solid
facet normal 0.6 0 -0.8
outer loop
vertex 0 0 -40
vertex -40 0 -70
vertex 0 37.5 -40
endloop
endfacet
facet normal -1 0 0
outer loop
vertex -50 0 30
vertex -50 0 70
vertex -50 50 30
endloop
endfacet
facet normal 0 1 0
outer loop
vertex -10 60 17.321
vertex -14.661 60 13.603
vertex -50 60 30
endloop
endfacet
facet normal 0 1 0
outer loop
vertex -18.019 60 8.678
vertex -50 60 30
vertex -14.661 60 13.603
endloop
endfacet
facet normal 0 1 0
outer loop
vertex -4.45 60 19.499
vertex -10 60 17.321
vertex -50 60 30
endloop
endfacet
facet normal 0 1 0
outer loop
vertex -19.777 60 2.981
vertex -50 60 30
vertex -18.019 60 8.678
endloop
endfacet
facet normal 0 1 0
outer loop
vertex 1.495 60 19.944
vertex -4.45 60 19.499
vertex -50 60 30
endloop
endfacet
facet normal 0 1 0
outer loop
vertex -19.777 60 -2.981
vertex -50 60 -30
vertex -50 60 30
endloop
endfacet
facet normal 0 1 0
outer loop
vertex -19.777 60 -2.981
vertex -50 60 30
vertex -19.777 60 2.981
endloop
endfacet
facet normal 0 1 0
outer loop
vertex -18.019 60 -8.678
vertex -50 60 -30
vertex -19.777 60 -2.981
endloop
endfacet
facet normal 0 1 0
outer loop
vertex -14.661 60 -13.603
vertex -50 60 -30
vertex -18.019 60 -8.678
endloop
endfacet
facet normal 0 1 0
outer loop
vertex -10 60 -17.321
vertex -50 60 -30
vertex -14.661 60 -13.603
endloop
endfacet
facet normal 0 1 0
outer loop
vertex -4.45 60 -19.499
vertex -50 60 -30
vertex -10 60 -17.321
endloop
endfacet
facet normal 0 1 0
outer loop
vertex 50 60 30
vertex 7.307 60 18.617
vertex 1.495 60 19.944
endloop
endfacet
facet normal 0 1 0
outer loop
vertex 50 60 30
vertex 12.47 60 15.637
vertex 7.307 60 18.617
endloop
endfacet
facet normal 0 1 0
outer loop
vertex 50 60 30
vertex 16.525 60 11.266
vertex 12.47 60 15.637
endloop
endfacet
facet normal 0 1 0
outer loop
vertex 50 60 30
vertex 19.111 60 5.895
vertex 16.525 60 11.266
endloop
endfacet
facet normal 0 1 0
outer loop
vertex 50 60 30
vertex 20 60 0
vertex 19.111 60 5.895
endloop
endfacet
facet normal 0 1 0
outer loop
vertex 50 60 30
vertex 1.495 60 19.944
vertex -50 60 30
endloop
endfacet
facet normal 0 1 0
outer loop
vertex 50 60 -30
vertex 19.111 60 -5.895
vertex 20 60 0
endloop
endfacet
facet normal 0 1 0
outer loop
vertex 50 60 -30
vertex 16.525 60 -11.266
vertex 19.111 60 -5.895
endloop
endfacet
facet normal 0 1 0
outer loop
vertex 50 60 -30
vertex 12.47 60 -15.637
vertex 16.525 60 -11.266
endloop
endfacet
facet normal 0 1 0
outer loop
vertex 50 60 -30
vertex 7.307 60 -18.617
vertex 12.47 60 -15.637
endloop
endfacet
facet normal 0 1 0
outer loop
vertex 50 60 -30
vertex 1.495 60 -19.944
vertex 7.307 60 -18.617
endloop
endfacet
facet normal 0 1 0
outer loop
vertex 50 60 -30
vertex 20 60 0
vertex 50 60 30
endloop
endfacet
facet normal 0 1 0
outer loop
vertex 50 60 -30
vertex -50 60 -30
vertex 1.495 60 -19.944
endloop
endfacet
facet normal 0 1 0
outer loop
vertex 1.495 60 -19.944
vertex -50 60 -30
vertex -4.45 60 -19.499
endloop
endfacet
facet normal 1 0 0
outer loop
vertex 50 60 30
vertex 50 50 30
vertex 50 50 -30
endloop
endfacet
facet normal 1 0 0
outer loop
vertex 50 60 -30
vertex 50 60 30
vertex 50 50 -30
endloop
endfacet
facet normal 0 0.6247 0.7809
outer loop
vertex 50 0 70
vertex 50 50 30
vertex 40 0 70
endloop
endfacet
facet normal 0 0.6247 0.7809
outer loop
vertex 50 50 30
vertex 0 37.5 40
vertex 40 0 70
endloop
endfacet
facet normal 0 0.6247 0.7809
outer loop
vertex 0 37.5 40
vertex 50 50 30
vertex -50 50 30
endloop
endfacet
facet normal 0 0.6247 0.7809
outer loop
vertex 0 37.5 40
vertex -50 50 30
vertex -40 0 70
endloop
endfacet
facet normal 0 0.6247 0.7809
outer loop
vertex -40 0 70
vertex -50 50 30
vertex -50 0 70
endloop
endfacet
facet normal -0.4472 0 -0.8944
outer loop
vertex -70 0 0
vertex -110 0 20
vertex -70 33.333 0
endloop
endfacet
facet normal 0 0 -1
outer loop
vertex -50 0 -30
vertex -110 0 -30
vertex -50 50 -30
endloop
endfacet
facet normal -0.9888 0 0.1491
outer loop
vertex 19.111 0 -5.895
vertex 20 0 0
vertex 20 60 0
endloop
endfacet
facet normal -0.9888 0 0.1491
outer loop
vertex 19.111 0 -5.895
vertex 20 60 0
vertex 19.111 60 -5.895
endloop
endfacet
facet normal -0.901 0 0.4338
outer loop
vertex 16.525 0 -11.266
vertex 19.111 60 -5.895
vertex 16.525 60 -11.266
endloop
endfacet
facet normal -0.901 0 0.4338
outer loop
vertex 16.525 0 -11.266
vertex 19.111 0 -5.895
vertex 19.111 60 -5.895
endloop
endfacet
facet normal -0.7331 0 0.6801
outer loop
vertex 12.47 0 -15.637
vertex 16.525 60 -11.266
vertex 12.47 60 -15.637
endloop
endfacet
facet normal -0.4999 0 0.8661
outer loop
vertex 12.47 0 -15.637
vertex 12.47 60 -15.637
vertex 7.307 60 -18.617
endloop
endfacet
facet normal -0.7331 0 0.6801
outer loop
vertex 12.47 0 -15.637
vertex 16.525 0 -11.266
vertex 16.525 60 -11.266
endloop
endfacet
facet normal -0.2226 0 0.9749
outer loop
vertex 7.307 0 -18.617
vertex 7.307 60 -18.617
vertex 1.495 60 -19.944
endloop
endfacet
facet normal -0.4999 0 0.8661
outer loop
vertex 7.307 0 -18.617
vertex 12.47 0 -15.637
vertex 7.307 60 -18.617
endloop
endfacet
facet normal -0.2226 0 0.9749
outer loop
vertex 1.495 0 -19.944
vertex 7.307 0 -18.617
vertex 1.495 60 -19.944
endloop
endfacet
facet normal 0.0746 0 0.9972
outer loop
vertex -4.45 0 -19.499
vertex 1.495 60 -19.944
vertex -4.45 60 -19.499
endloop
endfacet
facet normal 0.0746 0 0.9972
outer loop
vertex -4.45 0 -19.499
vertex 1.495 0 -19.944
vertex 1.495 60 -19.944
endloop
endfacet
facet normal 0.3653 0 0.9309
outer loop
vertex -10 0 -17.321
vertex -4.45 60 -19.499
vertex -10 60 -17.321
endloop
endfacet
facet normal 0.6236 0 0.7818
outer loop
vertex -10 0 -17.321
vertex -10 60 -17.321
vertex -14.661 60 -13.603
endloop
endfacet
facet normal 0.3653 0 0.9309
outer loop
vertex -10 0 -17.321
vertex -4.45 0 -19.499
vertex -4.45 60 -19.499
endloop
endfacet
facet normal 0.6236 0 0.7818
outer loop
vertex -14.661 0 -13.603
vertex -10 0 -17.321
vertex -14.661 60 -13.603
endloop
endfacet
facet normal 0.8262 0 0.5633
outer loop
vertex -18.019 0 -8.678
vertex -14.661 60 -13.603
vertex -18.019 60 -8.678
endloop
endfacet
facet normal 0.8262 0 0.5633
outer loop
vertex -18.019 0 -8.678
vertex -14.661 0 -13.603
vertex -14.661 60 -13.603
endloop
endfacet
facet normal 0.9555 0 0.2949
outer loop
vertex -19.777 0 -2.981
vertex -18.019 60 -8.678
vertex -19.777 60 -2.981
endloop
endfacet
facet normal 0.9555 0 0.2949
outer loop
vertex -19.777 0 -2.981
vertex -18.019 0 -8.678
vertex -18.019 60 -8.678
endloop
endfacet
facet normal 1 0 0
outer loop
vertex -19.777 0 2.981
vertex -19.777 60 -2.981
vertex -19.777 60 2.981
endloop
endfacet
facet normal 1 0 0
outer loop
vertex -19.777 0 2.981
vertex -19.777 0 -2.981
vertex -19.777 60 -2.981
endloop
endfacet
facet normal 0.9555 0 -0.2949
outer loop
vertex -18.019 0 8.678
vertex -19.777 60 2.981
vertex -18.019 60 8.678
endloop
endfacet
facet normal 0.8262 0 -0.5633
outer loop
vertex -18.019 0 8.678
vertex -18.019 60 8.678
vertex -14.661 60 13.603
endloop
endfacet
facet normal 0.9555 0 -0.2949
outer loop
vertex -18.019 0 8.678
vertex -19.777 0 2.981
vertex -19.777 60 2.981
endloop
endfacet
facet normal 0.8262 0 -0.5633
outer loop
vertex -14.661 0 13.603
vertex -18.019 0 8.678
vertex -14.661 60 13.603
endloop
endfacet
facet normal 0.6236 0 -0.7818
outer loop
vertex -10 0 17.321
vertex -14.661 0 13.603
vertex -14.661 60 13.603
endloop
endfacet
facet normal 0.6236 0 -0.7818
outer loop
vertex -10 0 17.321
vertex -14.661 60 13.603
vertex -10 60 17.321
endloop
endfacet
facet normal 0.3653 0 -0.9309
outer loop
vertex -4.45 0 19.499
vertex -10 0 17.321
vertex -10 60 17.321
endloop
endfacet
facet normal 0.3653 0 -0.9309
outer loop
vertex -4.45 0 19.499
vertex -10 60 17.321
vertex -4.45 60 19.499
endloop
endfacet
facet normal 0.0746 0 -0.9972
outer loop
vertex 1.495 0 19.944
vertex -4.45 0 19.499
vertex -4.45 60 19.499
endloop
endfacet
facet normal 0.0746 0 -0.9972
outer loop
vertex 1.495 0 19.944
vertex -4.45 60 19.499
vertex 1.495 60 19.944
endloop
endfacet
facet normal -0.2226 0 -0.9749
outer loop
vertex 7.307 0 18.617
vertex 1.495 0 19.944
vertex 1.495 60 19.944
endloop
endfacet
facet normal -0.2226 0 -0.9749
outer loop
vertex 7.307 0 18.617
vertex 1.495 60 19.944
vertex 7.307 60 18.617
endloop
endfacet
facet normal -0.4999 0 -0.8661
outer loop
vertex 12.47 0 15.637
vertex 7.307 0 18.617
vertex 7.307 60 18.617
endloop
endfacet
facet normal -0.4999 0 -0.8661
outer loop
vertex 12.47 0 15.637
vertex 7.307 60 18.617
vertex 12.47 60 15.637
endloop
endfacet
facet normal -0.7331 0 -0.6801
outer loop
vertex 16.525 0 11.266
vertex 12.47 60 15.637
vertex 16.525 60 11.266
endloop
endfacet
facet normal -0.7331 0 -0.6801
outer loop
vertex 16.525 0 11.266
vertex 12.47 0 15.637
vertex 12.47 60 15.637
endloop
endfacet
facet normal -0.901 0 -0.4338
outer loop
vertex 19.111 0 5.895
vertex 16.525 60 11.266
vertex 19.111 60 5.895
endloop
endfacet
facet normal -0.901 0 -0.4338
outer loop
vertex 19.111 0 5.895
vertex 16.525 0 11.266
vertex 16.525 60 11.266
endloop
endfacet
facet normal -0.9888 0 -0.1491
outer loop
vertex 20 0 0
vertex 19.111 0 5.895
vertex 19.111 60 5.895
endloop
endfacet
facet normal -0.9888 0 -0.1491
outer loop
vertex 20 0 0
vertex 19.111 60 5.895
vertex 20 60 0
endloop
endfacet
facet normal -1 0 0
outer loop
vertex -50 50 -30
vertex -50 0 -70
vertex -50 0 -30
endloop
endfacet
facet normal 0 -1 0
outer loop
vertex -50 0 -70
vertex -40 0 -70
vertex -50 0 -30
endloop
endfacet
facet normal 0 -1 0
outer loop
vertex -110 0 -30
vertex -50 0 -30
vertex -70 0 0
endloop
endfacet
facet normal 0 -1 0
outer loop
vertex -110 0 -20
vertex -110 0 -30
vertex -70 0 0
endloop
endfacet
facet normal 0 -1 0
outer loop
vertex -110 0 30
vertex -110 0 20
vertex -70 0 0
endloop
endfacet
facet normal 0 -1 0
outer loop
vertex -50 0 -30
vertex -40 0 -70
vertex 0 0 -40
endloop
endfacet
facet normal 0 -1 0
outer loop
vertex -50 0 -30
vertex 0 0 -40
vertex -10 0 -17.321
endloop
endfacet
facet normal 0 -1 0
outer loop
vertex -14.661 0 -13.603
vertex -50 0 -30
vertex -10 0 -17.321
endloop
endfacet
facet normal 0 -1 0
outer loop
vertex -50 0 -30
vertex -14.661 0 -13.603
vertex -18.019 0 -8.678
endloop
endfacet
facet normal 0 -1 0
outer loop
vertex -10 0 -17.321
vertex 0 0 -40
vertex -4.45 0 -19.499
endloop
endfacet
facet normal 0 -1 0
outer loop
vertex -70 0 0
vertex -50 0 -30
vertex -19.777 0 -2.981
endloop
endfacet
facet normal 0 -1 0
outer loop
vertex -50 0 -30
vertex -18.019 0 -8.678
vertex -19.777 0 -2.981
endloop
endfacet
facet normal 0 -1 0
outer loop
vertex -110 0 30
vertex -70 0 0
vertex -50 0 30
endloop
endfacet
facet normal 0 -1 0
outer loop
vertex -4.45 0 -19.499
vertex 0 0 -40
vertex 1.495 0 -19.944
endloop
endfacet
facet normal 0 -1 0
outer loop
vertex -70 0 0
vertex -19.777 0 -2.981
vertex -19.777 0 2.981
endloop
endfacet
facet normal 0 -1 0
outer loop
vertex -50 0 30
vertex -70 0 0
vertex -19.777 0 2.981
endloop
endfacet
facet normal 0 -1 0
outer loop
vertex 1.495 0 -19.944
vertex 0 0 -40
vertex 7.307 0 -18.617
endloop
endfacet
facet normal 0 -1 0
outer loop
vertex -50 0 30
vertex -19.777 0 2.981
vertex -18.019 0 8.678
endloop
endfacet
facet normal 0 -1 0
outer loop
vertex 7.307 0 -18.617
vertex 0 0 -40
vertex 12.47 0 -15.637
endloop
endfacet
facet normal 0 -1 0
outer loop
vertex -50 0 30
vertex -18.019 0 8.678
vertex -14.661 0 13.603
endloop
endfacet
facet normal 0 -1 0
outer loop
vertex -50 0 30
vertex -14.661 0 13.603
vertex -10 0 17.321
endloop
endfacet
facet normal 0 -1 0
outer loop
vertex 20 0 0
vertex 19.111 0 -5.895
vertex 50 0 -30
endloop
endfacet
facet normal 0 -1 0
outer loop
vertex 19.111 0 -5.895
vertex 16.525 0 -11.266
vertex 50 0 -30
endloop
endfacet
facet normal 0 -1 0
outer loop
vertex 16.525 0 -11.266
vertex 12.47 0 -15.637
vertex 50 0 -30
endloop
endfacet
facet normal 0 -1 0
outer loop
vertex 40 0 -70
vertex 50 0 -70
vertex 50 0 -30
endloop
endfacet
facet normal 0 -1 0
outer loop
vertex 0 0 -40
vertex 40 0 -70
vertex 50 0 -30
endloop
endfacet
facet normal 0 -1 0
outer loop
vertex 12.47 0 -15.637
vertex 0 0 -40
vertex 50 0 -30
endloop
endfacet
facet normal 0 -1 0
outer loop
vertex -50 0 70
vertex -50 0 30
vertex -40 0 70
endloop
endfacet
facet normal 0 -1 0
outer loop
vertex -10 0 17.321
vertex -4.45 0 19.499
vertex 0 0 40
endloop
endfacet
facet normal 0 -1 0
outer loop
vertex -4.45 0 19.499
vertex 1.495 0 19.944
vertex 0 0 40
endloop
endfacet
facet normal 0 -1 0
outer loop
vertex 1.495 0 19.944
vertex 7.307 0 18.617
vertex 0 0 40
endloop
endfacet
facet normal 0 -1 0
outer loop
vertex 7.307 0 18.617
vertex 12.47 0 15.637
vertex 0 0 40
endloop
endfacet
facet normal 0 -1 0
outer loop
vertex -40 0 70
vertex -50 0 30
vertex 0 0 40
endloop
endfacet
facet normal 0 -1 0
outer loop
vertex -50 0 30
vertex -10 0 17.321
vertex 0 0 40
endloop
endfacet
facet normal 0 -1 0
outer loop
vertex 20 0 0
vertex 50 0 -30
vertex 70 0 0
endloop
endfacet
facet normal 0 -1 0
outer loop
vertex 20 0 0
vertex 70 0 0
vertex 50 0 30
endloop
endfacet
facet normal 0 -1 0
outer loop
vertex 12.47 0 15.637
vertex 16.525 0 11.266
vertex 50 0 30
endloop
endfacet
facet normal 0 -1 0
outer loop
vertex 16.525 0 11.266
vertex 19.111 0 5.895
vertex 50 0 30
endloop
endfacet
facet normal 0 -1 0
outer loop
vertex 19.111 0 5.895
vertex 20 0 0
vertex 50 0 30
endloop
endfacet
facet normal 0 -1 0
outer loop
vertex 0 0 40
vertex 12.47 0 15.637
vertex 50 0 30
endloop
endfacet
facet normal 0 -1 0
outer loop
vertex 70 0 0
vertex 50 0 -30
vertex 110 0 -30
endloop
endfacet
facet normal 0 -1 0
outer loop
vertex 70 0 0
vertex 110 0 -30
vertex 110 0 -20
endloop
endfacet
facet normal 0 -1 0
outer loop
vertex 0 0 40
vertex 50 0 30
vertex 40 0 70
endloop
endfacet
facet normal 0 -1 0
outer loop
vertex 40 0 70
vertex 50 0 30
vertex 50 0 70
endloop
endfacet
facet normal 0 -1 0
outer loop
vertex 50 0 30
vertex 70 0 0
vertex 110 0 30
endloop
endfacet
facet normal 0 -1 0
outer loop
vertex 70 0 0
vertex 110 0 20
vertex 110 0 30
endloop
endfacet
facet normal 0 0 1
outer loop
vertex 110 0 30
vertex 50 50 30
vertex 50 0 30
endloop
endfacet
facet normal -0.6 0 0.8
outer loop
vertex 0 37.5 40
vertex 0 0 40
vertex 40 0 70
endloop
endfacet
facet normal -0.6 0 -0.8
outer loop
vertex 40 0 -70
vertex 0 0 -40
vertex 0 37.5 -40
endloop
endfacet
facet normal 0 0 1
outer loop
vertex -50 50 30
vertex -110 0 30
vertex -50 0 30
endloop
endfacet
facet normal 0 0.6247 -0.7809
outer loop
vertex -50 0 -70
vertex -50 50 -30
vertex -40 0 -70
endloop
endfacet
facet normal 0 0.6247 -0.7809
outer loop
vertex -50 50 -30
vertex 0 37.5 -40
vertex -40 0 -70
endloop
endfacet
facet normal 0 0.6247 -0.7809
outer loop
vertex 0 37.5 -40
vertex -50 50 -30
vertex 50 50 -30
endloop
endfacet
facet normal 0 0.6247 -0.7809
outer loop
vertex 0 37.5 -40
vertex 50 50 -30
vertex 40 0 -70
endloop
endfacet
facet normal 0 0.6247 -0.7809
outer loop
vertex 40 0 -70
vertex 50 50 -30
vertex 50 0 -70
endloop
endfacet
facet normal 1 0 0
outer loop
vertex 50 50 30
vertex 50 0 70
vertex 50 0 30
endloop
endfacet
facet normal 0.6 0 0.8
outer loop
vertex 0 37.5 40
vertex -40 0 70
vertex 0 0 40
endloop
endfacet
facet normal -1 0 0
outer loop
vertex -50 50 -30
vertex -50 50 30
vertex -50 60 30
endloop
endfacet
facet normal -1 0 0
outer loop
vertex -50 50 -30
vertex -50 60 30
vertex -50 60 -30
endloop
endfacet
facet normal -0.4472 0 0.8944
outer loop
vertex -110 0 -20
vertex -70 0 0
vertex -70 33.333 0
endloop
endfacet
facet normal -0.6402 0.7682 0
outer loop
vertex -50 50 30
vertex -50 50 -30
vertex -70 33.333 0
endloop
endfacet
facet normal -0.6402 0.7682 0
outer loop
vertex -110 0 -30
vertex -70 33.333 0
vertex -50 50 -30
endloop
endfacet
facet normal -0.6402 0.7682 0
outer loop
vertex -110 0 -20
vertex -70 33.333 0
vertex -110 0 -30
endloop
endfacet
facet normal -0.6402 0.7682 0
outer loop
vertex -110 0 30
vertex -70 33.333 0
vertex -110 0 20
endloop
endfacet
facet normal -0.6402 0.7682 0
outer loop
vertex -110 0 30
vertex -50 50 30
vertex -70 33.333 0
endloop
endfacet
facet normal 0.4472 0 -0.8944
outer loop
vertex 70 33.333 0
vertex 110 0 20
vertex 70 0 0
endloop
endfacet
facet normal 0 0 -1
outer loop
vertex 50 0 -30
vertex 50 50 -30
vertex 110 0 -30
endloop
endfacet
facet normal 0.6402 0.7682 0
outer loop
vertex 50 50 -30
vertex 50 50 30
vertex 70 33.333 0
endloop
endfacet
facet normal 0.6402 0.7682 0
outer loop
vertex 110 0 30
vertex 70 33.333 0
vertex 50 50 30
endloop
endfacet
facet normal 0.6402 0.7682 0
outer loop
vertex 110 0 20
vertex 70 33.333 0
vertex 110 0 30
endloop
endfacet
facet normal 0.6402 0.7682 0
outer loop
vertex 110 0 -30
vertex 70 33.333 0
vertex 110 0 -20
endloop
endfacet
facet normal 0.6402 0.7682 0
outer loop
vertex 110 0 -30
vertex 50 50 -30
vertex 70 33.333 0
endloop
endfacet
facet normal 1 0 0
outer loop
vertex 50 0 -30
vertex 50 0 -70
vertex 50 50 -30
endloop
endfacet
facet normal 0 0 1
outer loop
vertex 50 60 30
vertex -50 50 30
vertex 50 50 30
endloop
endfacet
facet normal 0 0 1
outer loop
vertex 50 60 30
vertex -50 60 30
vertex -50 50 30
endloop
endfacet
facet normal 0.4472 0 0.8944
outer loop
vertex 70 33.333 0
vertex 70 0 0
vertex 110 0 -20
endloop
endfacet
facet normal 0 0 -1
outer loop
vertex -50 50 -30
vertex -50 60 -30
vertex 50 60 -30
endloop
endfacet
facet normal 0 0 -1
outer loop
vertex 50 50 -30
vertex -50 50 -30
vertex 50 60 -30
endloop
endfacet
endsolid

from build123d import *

# Parameters (mm, degrees)
SKETCH1_W           = 100
SKETCH1_H           = 60
SKETCH1_R           = 20
BOSS_EXTRUDE1_DEPTH = 60
BOSS_EXTRUDE2_DEPTH = 30
BOSS_EXTRUDE3_DEPTH = 50
CUT_EXTRUDE1_DEPTH  = 61


with BuildPart() as part:
    # Sketch1 → Boss-Extrude1 (new body)
    with BuildSketch(Plane(origin=(0, 0, 0), x_dir=(1, 0, 0), z_dir=(0, 1, 0))):
        Rectangle(SKETCH1_W, SKETCH1_H)
        Circle(SKETCH1_R, mode=Mode.SUBTRACT)
    extrude(amount=BOSS_EXTRUDE1_DEPTH)

    # Sketch3 → Boss-Extrude2 (add, symmetric)
    with BuildSketch(Plane.XY):
        Polygon((50, 0), (50, 50), (110, 0), align=None)
        Polygon((-110, 0), (-50, 0), (-50, 50), align=None)
    extrude(amount=BOSS_EXTRUDE2_DEPTH, both=True)

    # Sketch4 → Boss-Extrude3 (add, symmetric)
    with BuildSketch(Plane(origin=(0, 0, 0), x_dir=(0, 0, -1), z_dir=(1, 0, 0))):
        Polygon((-30, 0), (-30, 50), (-70, 0), align=None)
        Polygon((30, 0), (30, 50), (70, 0), align=None)
    extrude(amount=BOSS_EXTRUDE3_DEPTH, both=True)

    # Sketch5 → Cut-Extrude1 (cut, through all)
    with BuildSketch(Plane(origin=(0, 0, 0), x_dir=(1, 0, 0), z_dir=(0, 1, 0))):
        Polygon((-40, -70), (0, -40), (40, -70), align=None)
        Polygon((0, 40), (40, 70), (-40, 70), align=None)
        Polygon((110, -20), (70, 0), (110, 20), align=None)
        Polygon((-110, 20), (-110, -20), (-70, 0), align=None)
    extrude(amount=CUT_EXTRUDE1_DEPTH, mode=Mode.SUBTRACT)


solid = part.part
